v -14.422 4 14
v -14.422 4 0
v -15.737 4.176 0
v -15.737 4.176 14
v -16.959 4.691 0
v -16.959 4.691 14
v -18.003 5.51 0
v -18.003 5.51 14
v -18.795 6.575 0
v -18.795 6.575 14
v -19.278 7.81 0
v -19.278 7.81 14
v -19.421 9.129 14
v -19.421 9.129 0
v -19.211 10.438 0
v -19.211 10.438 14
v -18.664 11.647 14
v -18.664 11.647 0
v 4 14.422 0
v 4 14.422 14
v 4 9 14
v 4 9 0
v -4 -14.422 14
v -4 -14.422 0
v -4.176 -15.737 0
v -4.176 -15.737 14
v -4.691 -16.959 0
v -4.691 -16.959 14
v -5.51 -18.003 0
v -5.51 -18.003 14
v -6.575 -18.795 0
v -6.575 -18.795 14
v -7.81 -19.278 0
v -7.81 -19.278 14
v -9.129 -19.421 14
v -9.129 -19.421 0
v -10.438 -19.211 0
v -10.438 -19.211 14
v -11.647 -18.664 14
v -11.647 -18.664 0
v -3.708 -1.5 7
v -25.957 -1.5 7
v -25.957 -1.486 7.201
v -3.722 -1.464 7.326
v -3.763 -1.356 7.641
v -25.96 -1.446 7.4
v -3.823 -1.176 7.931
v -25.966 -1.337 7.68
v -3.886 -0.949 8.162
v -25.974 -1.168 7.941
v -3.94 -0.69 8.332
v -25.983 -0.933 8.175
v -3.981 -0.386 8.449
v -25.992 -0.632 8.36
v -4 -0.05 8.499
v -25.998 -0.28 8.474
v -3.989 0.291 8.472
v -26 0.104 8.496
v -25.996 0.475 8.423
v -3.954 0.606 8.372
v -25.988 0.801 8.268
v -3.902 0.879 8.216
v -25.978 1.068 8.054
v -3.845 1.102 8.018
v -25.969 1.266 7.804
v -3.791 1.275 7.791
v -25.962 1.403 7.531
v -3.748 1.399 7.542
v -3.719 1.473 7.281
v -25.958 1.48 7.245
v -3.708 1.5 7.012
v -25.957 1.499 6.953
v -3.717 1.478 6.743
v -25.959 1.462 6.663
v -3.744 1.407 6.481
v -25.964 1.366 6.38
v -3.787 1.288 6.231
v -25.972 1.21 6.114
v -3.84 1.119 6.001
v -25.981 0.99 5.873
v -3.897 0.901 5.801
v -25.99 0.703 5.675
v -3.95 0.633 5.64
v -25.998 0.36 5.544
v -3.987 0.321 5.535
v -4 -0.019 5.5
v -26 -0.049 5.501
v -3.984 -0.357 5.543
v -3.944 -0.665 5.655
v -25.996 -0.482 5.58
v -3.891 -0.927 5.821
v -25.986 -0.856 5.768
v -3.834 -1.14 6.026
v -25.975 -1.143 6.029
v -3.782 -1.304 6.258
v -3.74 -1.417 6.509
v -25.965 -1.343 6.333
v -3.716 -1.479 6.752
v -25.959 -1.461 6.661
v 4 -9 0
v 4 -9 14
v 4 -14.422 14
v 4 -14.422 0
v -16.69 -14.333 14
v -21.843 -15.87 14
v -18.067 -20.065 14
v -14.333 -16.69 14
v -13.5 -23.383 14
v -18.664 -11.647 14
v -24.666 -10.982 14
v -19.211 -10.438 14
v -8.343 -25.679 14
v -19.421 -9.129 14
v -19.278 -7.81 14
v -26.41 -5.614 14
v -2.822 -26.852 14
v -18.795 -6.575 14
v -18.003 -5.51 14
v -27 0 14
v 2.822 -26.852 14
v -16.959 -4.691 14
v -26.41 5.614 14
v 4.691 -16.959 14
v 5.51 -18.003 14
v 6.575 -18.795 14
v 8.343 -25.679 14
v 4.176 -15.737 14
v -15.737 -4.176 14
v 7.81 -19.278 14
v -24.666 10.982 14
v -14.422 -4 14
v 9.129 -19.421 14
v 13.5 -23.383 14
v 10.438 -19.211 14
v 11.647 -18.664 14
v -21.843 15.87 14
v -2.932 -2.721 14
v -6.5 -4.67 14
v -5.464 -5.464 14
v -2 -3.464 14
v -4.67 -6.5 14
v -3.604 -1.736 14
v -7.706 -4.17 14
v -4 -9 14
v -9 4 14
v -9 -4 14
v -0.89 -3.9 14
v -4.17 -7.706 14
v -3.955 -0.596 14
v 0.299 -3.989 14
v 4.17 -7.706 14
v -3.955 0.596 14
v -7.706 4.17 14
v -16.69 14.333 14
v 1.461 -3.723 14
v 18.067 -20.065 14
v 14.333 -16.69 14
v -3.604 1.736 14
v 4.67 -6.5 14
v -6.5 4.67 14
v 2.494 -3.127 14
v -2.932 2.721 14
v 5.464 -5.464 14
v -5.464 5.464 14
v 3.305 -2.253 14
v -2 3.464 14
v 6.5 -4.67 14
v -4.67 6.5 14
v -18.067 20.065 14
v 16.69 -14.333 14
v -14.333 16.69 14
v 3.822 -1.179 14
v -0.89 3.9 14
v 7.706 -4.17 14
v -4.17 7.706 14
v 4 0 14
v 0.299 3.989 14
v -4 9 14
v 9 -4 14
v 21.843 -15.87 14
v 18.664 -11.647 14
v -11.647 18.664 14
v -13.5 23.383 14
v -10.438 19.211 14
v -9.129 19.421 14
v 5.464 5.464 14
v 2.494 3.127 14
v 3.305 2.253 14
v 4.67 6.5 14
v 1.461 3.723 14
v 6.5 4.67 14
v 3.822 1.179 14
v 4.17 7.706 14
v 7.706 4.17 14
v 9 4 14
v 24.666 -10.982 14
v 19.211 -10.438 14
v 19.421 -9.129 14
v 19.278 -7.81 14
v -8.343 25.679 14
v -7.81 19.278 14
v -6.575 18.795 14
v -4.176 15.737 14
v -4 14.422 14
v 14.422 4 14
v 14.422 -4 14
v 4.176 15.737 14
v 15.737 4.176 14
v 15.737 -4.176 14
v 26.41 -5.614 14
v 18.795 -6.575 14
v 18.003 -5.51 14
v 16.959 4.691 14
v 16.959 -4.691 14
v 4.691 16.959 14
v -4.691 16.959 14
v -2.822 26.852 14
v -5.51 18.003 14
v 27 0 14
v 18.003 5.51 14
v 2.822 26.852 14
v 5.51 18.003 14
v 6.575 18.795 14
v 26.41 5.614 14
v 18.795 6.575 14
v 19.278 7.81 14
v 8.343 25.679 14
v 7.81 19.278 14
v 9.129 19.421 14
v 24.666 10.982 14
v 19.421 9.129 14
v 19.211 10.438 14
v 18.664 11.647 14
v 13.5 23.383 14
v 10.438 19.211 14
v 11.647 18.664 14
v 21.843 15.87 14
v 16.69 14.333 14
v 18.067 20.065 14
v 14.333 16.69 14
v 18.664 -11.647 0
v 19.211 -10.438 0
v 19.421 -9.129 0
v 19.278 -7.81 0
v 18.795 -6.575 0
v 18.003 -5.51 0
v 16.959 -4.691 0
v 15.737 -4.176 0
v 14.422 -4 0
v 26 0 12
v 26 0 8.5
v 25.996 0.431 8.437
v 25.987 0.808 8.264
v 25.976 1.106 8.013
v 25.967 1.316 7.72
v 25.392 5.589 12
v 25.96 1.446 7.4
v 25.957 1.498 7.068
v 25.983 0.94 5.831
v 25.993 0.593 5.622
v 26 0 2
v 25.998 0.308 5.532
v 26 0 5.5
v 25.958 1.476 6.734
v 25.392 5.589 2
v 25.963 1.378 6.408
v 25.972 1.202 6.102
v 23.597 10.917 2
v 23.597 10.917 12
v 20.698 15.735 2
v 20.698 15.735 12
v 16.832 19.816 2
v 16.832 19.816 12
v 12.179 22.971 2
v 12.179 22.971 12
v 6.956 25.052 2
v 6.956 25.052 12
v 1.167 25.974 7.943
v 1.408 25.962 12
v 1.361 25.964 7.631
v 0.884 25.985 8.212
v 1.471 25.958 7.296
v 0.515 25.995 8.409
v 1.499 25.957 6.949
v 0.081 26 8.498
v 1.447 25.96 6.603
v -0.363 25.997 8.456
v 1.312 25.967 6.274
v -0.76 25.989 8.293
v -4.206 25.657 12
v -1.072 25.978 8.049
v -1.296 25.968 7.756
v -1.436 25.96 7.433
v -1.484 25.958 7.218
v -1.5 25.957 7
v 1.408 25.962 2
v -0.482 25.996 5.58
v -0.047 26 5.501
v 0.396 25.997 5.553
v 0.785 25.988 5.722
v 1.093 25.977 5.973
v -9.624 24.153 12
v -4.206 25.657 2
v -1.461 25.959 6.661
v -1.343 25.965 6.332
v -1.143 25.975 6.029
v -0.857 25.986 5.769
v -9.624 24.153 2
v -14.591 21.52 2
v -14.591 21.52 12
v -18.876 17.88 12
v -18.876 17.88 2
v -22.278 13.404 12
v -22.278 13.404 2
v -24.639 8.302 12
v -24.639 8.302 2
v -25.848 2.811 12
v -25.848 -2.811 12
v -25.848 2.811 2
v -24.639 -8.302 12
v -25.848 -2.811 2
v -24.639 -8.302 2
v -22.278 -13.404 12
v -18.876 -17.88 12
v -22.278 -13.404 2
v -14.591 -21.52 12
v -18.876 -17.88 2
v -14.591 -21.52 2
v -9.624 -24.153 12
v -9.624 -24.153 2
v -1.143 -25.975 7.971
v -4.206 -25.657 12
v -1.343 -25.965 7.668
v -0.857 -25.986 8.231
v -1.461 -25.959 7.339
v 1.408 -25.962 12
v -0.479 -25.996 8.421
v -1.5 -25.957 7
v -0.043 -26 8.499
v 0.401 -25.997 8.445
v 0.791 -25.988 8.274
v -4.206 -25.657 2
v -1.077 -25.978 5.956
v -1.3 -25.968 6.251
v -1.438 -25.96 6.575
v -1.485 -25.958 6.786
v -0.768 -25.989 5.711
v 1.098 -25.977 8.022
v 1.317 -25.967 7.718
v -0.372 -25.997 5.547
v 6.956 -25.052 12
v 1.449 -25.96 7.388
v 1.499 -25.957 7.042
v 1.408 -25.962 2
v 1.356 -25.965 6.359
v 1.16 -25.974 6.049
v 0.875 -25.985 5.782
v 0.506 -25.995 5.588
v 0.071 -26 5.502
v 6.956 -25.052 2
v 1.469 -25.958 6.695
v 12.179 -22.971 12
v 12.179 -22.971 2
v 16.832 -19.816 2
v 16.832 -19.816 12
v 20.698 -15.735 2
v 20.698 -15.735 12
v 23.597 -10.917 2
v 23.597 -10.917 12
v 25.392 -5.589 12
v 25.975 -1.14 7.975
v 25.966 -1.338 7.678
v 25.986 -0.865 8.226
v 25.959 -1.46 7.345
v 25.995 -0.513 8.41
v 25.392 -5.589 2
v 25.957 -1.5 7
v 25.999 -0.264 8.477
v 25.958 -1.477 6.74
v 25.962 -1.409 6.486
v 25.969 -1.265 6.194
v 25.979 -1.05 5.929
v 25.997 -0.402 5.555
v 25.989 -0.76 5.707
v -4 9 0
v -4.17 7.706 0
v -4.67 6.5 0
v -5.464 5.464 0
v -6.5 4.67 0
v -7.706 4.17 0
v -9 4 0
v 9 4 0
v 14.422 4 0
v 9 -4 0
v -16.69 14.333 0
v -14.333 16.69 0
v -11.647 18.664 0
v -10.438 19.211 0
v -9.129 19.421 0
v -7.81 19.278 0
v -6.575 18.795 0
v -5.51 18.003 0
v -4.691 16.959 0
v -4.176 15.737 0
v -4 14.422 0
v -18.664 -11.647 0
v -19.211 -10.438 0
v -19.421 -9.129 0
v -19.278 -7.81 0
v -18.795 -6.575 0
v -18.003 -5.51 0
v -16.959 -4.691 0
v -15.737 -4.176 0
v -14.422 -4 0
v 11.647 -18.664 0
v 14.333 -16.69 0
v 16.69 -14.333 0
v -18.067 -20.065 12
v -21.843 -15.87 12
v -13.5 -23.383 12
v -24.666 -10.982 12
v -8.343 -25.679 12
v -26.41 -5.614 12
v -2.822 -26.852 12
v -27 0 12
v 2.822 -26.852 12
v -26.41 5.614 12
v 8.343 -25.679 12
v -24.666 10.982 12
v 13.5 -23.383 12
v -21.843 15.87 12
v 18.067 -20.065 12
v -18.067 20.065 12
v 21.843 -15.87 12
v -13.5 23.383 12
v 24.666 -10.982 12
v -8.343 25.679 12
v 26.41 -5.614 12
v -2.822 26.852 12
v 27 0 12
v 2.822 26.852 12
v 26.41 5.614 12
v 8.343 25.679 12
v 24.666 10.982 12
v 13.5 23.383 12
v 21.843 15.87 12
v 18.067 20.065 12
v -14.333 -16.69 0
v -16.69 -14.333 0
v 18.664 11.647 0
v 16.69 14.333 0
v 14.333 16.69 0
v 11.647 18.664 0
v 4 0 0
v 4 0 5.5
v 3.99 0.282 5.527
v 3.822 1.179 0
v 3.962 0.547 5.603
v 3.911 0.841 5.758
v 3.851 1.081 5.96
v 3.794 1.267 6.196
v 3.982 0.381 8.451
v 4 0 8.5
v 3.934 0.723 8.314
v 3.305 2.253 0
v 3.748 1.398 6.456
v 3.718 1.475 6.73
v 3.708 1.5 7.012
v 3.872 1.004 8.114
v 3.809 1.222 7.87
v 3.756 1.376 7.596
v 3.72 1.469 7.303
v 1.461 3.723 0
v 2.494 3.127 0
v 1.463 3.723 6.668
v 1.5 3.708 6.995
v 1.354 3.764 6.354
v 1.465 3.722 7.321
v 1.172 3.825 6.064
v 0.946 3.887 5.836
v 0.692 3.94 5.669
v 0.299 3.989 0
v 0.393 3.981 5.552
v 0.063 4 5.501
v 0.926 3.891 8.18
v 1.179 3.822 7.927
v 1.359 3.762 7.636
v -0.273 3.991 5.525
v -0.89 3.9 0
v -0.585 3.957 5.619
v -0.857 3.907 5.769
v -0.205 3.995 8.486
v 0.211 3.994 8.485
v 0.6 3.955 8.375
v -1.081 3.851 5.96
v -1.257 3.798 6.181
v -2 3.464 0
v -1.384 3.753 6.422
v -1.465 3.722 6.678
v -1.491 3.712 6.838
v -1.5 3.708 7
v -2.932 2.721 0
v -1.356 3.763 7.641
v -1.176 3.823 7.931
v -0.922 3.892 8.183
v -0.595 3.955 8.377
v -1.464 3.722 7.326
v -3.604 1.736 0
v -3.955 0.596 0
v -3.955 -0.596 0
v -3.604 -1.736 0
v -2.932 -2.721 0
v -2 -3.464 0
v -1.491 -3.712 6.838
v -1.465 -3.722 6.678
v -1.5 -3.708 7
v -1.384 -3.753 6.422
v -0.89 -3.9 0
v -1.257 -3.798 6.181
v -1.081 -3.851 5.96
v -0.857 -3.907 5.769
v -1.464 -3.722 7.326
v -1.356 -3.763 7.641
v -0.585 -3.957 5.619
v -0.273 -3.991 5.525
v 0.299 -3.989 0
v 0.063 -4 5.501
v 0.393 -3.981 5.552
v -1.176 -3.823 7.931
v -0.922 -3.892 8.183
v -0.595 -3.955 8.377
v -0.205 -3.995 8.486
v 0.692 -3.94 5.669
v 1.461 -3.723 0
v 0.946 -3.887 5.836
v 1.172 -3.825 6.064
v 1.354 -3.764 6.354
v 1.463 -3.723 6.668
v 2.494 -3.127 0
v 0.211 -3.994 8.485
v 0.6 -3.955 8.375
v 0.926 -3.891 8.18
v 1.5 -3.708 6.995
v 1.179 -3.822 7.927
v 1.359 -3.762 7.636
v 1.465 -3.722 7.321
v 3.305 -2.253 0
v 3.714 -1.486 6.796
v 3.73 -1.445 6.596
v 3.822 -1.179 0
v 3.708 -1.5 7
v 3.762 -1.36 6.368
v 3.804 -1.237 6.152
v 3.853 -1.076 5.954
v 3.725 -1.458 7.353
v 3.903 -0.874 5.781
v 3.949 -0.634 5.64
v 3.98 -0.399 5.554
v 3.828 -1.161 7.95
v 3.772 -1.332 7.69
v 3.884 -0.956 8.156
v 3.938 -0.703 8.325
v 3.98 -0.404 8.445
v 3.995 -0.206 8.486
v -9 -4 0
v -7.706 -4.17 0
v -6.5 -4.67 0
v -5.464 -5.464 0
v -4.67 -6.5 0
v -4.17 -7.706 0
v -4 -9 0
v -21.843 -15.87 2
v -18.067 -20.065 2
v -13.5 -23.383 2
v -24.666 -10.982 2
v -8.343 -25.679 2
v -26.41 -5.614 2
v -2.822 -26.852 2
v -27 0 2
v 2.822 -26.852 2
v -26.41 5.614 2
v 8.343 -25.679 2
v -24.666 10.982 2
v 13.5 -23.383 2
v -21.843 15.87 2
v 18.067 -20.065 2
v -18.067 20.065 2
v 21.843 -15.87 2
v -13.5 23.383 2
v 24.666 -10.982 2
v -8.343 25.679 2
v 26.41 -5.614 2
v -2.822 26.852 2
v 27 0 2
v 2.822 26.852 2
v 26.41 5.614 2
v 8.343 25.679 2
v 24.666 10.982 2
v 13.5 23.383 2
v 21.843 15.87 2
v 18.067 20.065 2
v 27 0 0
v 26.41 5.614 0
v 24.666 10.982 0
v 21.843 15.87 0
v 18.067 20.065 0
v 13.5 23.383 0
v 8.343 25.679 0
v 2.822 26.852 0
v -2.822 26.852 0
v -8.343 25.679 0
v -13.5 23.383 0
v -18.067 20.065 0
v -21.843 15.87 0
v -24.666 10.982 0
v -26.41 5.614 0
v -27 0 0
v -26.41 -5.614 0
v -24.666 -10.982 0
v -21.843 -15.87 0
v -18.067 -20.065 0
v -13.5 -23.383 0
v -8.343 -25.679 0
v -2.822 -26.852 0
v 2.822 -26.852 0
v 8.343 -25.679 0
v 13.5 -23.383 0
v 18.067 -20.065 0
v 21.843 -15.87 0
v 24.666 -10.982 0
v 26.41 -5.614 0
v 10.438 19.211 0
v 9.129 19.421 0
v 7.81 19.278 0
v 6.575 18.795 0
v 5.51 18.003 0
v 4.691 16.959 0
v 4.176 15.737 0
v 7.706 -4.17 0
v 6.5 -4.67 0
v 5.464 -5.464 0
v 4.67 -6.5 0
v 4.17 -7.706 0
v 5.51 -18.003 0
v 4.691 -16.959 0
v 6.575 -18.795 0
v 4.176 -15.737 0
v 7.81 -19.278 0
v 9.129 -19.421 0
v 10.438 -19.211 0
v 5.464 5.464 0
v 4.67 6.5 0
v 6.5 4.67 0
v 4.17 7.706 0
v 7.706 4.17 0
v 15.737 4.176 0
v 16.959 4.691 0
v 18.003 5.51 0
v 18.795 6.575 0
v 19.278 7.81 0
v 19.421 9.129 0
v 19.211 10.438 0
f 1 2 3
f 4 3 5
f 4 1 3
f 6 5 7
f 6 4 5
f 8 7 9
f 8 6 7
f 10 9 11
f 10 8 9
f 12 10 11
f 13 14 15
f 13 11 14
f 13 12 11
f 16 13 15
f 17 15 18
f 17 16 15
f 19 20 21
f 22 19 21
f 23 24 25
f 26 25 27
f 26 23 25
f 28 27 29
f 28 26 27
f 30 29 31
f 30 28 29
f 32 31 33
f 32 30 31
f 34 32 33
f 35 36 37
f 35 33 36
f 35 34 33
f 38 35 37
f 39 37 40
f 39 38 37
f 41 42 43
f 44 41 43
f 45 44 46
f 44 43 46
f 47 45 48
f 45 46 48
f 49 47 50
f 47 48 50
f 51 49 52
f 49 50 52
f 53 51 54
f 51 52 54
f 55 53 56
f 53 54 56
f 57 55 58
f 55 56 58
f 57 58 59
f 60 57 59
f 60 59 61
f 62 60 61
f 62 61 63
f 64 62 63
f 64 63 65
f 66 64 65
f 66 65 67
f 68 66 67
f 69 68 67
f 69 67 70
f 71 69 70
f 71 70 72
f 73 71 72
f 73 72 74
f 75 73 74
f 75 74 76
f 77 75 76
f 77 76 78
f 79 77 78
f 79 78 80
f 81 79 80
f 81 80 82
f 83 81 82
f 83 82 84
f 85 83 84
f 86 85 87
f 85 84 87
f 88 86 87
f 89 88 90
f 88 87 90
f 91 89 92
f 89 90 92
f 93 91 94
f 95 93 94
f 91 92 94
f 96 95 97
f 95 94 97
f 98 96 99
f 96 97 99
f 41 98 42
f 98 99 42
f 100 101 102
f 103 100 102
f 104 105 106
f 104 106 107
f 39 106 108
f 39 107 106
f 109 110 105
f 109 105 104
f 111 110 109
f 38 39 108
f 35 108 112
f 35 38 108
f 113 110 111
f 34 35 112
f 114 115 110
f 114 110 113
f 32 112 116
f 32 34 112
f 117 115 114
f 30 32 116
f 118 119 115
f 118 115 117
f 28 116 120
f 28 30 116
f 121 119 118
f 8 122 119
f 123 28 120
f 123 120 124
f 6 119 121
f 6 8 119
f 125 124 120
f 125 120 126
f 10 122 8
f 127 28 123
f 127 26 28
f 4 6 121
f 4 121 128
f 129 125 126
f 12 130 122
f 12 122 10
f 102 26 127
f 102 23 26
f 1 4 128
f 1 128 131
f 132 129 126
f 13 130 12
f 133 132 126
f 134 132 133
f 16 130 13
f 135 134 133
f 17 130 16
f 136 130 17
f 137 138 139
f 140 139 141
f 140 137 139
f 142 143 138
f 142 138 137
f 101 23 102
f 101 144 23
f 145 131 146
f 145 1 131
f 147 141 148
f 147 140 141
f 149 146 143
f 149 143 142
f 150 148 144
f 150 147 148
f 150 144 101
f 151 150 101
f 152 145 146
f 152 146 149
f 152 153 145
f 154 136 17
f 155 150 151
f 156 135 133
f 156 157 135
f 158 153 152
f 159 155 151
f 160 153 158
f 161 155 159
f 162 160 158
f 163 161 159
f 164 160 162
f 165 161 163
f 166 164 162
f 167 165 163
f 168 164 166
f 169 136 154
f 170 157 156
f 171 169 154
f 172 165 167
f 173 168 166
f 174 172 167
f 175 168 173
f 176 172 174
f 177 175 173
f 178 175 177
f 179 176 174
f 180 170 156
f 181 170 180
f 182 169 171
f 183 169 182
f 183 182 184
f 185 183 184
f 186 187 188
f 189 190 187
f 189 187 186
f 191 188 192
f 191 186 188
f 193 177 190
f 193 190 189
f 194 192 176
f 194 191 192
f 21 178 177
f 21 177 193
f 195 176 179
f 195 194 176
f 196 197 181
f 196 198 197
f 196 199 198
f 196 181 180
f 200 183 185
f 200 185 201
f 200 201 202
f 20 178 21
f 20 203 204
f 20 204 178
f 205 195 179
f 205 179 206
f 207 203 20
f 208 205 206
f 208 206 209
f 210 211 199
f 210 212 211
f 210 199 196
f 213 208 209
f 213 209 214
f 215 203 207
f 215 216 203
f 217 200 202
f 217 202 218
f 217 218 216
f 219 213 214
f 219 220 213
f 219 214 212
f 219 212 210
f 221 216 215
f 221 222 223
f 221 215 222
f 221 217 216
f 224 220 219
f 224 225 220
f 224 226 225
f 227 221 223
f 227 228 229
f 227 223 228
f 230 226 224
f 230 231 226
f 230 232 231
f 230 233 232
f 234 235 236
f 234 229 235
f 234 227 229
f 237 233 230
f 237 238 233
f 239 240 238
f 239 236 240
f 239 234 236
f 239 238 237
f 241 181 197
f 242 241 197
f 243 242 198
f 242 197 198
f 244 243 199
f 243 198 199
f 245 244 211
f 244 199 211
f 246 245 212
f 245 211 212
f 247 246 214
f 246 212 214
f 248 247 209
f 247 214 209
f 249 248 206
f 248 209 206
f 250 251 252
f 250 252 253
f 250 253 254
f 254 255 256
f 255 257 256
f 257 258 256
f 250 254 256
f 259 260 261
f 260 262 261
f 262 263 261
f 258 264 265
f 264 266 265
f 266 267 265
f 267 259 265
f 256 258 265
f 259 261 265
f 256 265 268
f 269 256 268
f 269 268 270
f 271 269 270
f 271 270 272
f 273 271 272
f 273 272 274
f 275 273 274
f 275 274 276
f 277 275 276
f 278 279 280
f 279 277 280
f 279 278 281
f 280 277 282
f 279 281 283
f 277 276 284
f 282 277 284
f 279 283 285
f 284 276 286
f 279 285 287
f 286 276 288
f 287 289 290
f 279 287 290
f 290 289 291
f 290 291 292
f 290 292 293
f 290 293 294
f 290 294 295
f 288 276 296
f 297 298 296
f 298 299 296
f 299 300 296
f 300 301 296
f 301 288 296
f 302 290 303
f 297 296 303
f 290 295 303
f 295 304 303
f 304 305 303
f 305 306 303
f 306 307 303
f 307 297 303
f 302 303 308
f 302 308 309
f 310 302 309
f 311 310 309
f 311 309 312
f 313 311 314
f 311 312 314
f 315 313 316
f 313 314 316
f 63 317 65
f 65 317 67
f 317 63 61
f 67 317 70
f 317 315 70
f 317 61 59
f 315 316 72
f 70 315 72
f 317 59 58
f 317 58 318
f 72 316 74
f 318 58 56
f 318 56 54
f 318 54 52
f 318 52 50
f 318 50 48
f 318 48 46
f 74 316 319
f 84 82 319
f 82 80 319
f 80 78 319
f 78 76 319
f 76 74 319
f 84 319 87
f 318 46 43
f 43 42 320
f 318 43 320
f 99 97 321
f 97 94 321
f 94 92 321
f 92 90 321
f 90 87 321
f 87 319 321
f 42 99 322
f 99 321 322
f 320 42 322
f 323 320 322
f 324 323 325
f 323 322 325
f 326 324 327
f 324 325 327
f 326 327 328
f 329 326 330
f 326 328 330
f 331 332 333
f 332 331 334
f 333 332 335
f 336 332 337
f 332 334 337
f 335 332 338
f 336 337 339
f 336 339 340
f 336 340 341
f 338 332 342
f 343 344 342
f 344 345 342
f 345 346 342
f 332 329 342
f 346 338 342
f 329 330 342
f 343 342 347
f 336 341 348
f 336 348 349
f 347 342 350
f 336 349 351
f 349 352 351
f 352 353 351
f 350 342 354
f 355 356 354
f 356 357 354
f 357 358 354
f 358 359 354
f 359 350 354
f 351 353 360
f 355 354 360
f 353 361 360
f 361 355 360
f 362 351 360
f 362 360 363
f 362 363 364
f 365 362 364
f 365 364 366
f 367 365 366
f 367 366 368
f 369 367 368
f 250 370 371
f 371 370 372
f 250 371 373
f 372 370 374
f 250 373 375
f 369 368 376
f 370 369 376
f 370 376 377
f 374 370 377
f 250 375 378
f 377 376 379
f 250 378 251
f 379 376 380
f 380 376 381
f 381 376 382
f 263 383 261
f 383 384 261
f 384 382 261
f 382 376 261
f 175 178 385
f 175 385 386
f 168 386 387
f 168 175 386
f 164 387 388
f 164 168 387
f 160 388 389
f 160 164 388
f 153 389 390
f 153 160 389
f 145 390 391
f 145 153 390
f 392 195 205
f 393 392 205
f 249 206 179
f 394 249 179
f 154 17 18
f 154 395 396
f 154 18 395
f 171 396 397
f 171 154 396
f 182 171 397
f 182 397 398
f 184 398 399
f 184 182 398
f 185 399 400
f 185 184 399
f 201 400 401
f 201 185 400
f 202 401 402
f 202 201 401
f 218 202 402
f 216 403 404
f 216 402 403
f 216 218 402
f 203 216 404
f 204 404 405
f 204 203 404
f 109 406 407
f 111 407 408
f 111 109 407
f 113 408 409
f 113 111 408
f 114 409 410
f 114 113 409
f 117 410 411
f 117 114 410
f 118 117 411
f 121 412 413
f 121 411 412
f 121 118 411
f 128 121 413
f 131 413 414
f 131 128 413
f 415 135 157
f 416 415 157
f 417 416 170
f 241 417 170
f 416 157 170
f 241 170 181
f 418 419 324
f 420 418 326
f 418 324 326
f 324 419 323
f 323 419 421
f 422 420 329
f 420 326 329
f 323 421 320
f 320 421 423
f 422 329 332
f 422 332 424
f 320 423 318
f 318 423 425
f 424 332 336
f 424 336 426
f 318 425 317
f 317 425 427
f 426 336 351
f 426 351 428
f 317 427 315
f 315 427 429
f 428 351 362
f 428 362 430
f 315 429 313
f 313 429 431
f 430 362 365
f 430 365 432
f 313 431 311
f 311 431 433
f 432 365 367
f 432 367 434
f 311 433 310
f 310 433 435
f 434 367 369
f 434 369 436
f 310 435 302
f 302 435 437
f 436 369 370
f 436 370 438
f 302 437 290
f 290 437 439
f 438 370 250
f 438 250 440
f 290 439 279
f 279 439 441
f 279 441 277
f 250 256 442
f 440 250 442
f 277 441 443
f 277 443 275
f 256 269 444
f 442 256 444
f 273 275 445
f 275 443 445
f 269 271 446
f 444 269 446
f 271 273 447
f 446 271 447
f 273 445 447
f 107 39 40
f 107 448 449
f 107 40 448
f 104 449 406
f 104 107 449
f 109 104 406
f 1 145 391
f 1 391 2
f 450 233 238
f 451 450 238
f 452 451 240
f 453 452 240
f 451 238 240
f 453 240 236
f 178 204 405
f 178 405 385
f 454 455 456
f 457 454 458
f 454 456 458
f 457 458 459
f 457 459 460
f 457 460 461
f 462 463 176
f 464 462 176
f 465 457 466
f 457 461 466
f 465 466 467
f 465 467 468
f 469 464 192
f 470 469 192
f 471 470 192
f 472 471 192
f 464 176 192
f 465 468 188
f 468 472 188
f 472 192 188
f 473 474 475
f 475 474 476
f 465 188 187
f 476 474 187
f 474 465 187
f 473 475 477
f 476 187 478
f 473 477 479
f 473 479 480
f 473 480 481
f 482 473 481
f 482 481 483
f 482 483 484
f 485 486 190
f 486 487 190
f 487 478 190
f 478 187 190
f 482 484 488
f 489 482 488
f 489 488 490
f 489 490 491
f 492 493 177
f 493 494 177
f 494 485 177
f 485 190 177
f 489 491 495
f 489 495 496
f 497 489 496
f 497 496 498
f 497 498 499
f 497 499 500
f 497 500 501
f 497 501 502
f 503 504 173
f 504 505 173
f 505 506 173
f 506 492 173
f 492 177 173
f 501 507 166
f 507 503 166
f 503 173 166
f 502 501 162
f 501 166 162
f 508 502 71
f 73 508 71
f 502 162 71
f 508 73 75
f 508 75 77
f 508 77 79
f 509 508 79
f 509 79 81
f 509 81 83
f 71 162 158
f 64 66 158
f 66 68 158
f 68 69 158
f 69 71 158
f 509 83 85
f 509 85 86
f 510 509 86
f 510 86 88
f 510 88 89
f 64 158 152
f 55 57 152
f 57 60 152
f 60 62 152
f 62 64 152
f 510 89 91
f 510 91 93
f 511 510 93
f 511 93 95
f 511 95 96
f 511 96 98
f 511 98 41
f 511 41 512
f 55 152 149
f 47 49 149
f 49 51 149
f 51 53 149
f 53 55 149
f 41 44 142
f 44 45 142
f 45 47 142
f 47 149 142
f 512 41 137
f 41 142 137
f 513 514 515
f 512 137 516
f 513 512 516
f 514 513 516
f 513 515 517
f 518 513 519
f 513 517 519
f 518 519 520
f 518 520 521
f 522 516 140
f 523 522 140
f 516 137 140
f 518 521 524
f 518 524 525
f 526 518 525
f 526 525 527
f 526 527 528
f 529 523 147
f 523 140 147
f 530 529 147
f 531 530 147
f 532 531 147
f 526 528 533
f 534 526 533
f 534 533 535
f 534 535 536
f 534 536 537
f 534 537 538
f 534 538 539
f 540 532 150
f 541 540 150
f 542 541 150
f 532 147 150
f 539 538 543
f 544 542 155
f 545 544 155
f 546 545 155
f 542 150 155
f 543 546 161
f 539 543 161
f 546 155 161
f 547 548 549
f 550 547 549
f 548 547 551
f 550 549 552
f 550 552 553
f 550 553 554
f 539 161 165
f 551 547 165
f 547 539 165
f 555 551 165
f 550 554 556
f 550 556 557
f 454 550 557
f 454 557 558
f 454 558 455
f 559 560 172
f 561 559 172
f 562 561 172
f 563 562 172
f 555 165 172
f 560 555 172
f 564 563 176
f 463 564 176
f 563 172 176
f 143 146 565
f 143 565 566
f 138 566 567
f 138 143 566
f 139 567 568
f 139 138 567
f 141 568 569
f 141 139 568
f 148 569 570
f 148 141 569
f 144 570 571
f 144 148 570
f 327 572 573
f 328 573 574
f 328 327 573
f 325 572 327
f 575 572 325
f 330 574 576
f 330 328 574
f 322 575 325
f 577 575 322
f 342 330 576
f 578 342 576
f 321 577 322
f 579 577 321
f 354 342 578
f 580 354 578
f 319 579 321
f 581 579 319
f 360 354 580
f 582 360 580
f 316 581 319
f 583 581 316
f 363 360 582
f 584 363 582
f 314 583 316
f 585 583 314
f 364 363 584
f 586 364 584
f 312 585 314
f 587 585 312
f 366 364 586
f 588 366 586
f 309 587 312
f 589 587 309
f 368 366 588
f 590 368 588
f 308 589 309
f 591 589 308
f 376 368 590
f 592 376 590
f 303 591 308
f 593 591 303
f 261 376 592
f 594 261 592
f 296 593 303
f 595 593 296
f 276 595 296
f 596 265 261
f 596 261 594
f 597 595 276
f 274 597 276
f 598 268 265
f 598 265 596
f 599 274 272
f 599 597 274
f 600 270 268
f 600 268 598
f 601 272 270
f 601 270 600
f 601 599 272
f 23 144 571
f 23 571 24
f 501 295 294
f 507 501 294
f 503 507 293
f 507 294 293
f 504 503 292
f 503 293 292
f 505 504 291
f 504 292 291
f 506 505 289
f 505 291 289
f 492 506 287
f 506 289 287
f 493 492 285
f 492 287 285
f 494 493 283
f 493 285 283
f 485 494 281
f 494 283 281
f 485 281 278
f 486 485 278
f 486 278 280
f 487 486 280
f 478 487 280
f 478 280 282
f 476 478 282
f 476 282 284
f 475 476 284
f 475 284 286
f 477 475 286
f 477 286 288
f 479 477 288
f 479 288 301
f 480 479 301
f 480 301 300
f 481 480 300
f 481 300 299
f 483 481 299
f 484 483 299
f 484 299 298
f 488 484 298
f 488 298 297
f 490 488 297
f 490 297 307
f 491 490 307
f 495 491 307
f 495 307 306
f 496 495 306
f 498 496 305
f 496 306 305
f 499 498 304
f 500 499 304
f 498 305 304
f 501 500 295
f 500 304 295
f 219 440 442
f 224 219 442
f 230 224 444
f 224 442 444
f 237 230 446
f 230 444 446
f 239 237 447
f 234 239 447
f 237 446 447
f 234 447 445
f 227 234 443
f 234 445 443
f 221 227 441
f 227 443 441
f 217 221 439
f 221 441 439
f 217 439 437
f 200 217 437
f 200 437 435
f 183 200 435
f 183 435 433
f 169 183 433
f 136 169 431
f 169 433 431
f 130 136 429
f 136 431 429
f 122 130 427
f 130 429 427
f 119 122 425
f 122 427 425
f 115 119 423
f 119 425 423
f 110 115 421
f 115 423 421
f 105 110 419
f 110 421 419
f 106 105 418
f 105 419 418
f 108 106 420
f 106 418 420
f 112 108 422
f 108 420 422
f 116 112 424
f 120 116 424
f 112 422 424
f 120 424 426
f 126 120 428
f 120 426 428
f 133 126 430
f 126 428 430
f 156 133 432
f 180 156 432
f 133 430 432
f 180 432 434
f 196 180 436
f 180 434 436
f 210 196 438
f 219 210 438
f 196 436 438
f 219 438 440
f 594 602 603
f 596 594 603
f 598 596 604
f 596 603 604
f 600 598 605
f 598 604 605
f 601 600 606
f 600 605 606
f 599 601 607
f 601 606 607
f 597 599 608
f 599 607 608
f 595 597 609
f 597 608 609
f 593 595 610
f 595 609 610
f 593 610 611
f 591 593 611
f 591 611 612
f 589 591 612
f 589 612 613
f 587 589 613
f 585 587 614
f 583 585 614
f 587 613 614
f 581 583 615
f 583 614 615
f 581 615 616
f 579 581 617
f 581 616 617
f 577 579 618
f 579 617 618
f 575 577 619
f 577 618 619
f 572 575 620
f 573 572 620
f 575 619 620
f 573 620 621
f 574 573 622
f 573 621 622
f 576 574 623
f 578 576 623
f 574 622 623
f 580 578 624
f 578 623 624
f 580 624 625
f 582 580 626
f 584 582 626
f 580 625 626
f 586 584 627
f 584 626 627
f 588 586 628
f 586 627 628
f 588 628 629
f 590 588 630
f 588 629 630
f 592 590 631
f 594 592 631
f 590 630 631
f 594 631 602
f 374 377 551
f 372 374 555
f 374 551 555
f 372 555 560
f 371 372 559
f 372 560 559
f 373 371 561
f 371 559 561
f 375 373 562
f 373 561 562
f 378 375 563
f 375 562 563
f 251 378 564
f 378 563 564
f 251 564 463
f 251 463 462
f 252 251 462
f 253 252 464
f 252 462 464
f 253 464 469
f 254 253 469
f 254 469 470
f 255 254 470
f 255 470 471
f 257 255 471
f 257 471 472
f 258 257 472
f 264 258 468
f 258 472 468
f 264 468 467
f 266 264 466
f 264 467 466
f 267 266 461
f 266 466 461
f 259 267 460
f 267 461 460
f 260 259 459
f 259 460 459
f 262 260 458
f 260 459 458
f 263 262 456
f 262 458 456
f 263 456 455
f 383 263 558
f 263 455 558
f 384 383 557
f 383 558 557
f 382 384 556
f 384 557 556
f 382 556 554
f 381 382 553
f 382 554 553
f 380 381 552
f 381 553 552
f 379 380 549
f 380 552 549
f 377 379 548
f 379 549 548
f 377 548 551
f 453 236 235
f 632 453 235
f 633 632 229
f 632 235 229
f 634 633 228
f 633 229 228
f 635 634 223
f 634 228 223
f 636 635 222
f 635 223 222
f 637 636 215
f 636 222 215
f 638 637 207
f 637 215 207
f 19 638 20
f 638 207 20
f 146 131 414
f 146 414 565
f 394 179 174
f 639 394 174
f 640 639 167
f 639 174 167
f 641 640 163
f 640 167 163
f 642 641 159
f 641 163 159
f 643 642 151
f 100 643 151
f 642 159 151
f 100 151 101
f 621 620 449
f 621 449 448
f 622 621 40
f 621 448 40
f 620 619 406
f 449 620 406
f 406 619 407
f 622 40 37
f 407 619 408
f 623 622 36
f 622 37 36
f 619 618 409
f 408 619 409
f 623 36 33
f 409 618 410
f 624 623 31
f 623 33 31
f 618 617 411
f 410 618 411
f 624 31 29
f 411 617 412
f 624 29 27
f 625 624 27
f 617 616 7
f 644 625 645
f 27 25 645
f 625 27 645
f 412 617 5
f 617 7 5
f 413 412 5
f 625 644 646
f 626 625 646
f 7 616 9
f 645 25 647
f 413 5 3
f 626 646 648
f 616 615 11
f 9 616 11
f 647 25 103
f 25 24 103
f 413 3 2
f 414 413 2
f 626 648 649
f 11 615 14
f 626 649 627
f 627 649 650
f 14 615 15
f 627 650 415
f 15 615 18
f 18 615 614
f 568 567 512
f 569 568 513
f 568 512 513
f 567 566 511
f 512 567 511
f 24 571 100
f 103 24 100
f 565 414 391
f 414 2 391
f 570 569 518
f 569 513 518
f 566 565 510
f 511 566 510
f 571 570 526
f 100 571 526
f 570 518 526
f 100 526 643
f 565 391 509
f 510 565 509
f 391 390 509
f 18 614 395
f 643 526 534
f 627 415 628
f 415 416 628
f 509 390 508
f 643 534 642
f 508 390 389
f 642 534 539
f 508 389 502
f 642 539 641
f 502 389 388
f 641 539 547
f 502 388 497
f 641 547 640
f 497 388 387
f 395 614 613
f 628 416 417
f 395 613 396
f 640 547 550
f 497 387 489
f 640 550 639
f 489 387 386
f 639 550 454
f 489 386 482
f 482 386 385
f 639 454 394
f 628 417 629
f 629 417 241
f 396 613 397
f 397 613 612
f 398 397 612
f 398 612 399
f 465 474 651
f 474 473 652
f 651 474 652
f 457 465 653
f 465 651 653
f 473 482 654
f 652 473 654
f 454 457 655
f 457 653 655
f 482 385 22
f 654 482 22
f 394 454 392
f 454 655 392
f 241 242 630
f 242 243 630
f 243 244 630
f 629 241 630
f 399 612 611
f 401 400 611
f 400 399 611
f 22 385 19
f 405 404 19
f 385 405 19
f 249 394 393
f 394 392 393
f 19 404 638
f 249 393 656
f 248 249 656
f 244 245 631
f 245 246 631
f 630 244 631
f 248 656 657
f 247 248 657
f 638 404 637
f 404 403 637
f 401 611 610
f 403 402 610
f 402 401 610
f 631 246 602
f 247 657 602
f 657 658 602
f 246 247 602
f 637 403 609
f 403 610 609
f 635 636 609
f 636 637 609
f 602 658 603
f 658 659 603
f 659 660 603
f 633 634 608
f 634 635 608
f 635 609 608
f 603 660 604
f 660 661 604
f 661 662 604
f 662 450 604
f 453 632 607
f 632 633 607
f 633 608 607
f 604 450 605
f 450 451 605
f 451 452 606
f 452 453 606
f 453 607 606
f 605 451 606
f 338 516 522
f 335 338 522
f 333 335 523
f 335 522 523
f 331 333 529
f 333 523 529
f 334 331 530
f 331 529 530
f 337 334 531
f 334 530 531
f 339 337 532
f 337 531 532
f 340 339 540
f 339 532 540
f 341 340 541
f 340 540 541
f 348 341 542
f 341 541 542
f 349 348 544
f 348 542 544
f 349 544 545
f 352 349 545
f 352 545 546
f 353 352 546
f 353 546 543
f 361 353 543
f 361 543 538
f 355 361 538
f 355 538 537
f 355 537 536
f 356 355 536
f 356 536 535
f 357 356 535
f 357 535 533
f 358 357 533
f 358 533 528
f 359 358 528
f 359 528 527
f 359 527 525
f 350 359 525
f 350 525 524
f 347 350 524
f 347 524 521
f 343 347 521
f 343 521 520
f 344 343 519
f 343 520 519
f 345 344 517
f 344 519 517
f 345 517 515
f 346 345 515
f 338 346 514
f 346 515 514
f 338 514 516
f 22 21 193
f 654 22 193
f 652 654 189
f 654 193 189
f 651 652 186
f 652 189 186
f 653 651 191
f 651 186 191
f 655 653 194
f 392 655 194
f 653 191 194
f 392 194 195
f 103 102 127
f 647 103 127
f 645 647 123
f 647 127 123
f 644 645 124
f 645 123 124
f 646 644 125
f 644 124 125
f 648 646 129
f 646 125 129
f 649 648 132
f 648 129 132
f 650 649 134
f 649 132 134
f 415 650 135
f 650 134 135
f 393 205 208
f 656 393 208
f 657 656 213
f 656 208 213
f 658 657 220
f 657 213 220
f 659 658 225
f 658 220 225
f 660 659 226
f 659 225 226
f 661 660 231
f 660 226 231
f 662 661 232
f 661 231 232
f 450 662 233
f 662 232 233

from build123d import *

# Parameters (mm, degrees)
ESQUISSE1_R             = 27
BOSS_EXTRU_1_DEPTH      = 2
ESQUISSE2_R             = 26
BOSS_EXTRU_2_DEPTH      = 10
ESQUISSE3_R             = 27
BOSS_EXTRU_3_DEPTH      = 2
ESQUISSE4_R             = 4
ENL_V_MAT_EXTRU_1_DEPTH = 41.669398815
ENL_V_MAT_EXTRU_2_DEPTH = 41.669398815
ESQUISSE6_R             = 1.5
ENL_V_MAT_EXTRU_3_DEPTH = 62.10646447
ESQUISSE7_R             = 1.5
ENL_V_MAT_EXTRU_4_DEPTH = 62.106464493


with BuildPart() as part:
    # Esquisse1 → Boss.-Extru.1 (new body)
    with BuildSketch(Plane.XY):
        Circle(ESQUISSE1_R)
    extrude(amount=BOSS_EXTRU_1_DEPTH)

    # Esquisse2 → Boss.-Extru.2 (add)
    with BuildSketch(Plane.XY.offset(2)):
        Circle(ESQUISSE2_R)
    extrude(amount=BOSS_EXTRU_2_DEPTH)

    # Esquisse3 → Boss.-Extru.3 (add)
    with BuildSketch(Plane.XY.offset(12)):
        Circle(ESQUISSE3_R)
    extrude(amount=BOSS_EXTRU_3_DEPTH)

    # Esquisse4 → Enlèv. mat.-Extru.1 (cut, through all)
    with BuildSketch(Plane.XY.offset(14)):
        Circle(ESQUISSE4_R)
    extrude(amount=-ENL_V_MAT_EXTRU_1_DEPTH, mode=Mode.SUBTRACT)

    # Esquisse5 → Enlèv. mat.-Extru.2 (cut, through all)
    with BuildSketch(Plane.XY.offset(14)):
        with BuildLine():
            Line((-4, 14.422205102), (-4, 9))
            ThreePointArc((-4, 9), (-5.464466094, 5.464466094), (-9, 4))
            Line((-9, 4), (-14.422205102, 4))
            ThreePointArc((-14.422205102, 4), (-18.794578263, 6.57464375), (-18.664030132, 11.647058824))
            ThreePointArc((-18.664030132, 11.647058824), (-15.556349186, 15.556349186), (-11.647058824, 18.664030132))
            ThreePointArc((-11.647058824, 18.664030132), (-6.57464375, 18.794578263), (-4, 14.422205102))
        make_face()
        with BuildLine():
            Line((4, 14.422205102), (4, 9))
            ThreePointArc((4, 9), (5.464466094, 5.464466094), (9, 4))
            Line((9, 4), (14.422205102, 4))
            ThreePointArc((14.422205102, 4), (18.794578263, 6.57464375), (18.664030132, 11.647058824))
            ThreePointArc((18.664030132, 11.647058824), (15.556349186, 15.556349186), (11.647058824, 18.664030132))
            ThreePointArc((11.647058824, 18.664030132), (6.57464375, 18.794578263), (4, 14.422205102))
        make_face()
        with BuildLine():
            Line((14.422205102, -4), (9, -4))
            ThreePointArc((9, -4), (5.464466094, -5.464466094), (4, -9))
            Line((4, -9), (4, -14.422205102))
            ThreePointArc((4, -14.422205102), (6.57464375, -18.794578263), (11.647058824, -18.664030132))
            ThreePointArc((11.647058824, -18.664030132), (15.556349186, -15.556349186), (18.664030132, -11.647058824))
            ThreePointArc((18.664030132, -11.647058824), (18.794578263, -6.57464375), (14.422205102, -4))
        make_face()
        with BuildLine():
            Line((-4, -9), (-4, -14.422205102))
            ThreePointArc((-4, -14.422205102), (-6.57464375, -18.794578263), (-11.647058824, -18.664030132))
            ThreePointArc((-11.647058824, -18.664030132), (-15.556349186, -15.556349186), (-18.664030132, -11.647058824))
            ThreePointArc((-18.664030132, -11.647058824), (-18.794578263, -6.57464375), (-14.422205102, -4))
            Line((-14.422205102, -4), (-9, -4))
            ThreePointArc((-9, -4), (-5.464466094, -5.464466094), (-4, -9))
        make_face()
    extrude(amount=-ENL_V_MAT_EXTRU_2_DEPTH, mode=Mode.SUBTRACT)

    # Esquisse6 → Enlèv. mat.-Extru.3 (cut, through all)
    with BuildSketch(Plane(origin=(0, 26, 0), x_dir=(-1, 0, 0), z_dir=(0, 1, 0))):
        with Locations((0, 7)):
            Circle(ESQUISSE6_R)
    extrude(amount=-ENL_V_MAT_EXTRU_3_DEPTH, mode=Mode.SUBTRACT)

    # Esquisse7 → Enlèv. mat.-Extru.4 (cut, through all)
    with BuildSketch(Plane.ZY.offset(26)):
        with Locations(Location((7, 0, 0), (0, 0, 270))):
            Circle(ESQUISSE7_R)
    extrude(amount=-ENL_V_MAT_EXTRU_4_DEPTH, mode=Mode.SUBTRACT)


solid = part.part
